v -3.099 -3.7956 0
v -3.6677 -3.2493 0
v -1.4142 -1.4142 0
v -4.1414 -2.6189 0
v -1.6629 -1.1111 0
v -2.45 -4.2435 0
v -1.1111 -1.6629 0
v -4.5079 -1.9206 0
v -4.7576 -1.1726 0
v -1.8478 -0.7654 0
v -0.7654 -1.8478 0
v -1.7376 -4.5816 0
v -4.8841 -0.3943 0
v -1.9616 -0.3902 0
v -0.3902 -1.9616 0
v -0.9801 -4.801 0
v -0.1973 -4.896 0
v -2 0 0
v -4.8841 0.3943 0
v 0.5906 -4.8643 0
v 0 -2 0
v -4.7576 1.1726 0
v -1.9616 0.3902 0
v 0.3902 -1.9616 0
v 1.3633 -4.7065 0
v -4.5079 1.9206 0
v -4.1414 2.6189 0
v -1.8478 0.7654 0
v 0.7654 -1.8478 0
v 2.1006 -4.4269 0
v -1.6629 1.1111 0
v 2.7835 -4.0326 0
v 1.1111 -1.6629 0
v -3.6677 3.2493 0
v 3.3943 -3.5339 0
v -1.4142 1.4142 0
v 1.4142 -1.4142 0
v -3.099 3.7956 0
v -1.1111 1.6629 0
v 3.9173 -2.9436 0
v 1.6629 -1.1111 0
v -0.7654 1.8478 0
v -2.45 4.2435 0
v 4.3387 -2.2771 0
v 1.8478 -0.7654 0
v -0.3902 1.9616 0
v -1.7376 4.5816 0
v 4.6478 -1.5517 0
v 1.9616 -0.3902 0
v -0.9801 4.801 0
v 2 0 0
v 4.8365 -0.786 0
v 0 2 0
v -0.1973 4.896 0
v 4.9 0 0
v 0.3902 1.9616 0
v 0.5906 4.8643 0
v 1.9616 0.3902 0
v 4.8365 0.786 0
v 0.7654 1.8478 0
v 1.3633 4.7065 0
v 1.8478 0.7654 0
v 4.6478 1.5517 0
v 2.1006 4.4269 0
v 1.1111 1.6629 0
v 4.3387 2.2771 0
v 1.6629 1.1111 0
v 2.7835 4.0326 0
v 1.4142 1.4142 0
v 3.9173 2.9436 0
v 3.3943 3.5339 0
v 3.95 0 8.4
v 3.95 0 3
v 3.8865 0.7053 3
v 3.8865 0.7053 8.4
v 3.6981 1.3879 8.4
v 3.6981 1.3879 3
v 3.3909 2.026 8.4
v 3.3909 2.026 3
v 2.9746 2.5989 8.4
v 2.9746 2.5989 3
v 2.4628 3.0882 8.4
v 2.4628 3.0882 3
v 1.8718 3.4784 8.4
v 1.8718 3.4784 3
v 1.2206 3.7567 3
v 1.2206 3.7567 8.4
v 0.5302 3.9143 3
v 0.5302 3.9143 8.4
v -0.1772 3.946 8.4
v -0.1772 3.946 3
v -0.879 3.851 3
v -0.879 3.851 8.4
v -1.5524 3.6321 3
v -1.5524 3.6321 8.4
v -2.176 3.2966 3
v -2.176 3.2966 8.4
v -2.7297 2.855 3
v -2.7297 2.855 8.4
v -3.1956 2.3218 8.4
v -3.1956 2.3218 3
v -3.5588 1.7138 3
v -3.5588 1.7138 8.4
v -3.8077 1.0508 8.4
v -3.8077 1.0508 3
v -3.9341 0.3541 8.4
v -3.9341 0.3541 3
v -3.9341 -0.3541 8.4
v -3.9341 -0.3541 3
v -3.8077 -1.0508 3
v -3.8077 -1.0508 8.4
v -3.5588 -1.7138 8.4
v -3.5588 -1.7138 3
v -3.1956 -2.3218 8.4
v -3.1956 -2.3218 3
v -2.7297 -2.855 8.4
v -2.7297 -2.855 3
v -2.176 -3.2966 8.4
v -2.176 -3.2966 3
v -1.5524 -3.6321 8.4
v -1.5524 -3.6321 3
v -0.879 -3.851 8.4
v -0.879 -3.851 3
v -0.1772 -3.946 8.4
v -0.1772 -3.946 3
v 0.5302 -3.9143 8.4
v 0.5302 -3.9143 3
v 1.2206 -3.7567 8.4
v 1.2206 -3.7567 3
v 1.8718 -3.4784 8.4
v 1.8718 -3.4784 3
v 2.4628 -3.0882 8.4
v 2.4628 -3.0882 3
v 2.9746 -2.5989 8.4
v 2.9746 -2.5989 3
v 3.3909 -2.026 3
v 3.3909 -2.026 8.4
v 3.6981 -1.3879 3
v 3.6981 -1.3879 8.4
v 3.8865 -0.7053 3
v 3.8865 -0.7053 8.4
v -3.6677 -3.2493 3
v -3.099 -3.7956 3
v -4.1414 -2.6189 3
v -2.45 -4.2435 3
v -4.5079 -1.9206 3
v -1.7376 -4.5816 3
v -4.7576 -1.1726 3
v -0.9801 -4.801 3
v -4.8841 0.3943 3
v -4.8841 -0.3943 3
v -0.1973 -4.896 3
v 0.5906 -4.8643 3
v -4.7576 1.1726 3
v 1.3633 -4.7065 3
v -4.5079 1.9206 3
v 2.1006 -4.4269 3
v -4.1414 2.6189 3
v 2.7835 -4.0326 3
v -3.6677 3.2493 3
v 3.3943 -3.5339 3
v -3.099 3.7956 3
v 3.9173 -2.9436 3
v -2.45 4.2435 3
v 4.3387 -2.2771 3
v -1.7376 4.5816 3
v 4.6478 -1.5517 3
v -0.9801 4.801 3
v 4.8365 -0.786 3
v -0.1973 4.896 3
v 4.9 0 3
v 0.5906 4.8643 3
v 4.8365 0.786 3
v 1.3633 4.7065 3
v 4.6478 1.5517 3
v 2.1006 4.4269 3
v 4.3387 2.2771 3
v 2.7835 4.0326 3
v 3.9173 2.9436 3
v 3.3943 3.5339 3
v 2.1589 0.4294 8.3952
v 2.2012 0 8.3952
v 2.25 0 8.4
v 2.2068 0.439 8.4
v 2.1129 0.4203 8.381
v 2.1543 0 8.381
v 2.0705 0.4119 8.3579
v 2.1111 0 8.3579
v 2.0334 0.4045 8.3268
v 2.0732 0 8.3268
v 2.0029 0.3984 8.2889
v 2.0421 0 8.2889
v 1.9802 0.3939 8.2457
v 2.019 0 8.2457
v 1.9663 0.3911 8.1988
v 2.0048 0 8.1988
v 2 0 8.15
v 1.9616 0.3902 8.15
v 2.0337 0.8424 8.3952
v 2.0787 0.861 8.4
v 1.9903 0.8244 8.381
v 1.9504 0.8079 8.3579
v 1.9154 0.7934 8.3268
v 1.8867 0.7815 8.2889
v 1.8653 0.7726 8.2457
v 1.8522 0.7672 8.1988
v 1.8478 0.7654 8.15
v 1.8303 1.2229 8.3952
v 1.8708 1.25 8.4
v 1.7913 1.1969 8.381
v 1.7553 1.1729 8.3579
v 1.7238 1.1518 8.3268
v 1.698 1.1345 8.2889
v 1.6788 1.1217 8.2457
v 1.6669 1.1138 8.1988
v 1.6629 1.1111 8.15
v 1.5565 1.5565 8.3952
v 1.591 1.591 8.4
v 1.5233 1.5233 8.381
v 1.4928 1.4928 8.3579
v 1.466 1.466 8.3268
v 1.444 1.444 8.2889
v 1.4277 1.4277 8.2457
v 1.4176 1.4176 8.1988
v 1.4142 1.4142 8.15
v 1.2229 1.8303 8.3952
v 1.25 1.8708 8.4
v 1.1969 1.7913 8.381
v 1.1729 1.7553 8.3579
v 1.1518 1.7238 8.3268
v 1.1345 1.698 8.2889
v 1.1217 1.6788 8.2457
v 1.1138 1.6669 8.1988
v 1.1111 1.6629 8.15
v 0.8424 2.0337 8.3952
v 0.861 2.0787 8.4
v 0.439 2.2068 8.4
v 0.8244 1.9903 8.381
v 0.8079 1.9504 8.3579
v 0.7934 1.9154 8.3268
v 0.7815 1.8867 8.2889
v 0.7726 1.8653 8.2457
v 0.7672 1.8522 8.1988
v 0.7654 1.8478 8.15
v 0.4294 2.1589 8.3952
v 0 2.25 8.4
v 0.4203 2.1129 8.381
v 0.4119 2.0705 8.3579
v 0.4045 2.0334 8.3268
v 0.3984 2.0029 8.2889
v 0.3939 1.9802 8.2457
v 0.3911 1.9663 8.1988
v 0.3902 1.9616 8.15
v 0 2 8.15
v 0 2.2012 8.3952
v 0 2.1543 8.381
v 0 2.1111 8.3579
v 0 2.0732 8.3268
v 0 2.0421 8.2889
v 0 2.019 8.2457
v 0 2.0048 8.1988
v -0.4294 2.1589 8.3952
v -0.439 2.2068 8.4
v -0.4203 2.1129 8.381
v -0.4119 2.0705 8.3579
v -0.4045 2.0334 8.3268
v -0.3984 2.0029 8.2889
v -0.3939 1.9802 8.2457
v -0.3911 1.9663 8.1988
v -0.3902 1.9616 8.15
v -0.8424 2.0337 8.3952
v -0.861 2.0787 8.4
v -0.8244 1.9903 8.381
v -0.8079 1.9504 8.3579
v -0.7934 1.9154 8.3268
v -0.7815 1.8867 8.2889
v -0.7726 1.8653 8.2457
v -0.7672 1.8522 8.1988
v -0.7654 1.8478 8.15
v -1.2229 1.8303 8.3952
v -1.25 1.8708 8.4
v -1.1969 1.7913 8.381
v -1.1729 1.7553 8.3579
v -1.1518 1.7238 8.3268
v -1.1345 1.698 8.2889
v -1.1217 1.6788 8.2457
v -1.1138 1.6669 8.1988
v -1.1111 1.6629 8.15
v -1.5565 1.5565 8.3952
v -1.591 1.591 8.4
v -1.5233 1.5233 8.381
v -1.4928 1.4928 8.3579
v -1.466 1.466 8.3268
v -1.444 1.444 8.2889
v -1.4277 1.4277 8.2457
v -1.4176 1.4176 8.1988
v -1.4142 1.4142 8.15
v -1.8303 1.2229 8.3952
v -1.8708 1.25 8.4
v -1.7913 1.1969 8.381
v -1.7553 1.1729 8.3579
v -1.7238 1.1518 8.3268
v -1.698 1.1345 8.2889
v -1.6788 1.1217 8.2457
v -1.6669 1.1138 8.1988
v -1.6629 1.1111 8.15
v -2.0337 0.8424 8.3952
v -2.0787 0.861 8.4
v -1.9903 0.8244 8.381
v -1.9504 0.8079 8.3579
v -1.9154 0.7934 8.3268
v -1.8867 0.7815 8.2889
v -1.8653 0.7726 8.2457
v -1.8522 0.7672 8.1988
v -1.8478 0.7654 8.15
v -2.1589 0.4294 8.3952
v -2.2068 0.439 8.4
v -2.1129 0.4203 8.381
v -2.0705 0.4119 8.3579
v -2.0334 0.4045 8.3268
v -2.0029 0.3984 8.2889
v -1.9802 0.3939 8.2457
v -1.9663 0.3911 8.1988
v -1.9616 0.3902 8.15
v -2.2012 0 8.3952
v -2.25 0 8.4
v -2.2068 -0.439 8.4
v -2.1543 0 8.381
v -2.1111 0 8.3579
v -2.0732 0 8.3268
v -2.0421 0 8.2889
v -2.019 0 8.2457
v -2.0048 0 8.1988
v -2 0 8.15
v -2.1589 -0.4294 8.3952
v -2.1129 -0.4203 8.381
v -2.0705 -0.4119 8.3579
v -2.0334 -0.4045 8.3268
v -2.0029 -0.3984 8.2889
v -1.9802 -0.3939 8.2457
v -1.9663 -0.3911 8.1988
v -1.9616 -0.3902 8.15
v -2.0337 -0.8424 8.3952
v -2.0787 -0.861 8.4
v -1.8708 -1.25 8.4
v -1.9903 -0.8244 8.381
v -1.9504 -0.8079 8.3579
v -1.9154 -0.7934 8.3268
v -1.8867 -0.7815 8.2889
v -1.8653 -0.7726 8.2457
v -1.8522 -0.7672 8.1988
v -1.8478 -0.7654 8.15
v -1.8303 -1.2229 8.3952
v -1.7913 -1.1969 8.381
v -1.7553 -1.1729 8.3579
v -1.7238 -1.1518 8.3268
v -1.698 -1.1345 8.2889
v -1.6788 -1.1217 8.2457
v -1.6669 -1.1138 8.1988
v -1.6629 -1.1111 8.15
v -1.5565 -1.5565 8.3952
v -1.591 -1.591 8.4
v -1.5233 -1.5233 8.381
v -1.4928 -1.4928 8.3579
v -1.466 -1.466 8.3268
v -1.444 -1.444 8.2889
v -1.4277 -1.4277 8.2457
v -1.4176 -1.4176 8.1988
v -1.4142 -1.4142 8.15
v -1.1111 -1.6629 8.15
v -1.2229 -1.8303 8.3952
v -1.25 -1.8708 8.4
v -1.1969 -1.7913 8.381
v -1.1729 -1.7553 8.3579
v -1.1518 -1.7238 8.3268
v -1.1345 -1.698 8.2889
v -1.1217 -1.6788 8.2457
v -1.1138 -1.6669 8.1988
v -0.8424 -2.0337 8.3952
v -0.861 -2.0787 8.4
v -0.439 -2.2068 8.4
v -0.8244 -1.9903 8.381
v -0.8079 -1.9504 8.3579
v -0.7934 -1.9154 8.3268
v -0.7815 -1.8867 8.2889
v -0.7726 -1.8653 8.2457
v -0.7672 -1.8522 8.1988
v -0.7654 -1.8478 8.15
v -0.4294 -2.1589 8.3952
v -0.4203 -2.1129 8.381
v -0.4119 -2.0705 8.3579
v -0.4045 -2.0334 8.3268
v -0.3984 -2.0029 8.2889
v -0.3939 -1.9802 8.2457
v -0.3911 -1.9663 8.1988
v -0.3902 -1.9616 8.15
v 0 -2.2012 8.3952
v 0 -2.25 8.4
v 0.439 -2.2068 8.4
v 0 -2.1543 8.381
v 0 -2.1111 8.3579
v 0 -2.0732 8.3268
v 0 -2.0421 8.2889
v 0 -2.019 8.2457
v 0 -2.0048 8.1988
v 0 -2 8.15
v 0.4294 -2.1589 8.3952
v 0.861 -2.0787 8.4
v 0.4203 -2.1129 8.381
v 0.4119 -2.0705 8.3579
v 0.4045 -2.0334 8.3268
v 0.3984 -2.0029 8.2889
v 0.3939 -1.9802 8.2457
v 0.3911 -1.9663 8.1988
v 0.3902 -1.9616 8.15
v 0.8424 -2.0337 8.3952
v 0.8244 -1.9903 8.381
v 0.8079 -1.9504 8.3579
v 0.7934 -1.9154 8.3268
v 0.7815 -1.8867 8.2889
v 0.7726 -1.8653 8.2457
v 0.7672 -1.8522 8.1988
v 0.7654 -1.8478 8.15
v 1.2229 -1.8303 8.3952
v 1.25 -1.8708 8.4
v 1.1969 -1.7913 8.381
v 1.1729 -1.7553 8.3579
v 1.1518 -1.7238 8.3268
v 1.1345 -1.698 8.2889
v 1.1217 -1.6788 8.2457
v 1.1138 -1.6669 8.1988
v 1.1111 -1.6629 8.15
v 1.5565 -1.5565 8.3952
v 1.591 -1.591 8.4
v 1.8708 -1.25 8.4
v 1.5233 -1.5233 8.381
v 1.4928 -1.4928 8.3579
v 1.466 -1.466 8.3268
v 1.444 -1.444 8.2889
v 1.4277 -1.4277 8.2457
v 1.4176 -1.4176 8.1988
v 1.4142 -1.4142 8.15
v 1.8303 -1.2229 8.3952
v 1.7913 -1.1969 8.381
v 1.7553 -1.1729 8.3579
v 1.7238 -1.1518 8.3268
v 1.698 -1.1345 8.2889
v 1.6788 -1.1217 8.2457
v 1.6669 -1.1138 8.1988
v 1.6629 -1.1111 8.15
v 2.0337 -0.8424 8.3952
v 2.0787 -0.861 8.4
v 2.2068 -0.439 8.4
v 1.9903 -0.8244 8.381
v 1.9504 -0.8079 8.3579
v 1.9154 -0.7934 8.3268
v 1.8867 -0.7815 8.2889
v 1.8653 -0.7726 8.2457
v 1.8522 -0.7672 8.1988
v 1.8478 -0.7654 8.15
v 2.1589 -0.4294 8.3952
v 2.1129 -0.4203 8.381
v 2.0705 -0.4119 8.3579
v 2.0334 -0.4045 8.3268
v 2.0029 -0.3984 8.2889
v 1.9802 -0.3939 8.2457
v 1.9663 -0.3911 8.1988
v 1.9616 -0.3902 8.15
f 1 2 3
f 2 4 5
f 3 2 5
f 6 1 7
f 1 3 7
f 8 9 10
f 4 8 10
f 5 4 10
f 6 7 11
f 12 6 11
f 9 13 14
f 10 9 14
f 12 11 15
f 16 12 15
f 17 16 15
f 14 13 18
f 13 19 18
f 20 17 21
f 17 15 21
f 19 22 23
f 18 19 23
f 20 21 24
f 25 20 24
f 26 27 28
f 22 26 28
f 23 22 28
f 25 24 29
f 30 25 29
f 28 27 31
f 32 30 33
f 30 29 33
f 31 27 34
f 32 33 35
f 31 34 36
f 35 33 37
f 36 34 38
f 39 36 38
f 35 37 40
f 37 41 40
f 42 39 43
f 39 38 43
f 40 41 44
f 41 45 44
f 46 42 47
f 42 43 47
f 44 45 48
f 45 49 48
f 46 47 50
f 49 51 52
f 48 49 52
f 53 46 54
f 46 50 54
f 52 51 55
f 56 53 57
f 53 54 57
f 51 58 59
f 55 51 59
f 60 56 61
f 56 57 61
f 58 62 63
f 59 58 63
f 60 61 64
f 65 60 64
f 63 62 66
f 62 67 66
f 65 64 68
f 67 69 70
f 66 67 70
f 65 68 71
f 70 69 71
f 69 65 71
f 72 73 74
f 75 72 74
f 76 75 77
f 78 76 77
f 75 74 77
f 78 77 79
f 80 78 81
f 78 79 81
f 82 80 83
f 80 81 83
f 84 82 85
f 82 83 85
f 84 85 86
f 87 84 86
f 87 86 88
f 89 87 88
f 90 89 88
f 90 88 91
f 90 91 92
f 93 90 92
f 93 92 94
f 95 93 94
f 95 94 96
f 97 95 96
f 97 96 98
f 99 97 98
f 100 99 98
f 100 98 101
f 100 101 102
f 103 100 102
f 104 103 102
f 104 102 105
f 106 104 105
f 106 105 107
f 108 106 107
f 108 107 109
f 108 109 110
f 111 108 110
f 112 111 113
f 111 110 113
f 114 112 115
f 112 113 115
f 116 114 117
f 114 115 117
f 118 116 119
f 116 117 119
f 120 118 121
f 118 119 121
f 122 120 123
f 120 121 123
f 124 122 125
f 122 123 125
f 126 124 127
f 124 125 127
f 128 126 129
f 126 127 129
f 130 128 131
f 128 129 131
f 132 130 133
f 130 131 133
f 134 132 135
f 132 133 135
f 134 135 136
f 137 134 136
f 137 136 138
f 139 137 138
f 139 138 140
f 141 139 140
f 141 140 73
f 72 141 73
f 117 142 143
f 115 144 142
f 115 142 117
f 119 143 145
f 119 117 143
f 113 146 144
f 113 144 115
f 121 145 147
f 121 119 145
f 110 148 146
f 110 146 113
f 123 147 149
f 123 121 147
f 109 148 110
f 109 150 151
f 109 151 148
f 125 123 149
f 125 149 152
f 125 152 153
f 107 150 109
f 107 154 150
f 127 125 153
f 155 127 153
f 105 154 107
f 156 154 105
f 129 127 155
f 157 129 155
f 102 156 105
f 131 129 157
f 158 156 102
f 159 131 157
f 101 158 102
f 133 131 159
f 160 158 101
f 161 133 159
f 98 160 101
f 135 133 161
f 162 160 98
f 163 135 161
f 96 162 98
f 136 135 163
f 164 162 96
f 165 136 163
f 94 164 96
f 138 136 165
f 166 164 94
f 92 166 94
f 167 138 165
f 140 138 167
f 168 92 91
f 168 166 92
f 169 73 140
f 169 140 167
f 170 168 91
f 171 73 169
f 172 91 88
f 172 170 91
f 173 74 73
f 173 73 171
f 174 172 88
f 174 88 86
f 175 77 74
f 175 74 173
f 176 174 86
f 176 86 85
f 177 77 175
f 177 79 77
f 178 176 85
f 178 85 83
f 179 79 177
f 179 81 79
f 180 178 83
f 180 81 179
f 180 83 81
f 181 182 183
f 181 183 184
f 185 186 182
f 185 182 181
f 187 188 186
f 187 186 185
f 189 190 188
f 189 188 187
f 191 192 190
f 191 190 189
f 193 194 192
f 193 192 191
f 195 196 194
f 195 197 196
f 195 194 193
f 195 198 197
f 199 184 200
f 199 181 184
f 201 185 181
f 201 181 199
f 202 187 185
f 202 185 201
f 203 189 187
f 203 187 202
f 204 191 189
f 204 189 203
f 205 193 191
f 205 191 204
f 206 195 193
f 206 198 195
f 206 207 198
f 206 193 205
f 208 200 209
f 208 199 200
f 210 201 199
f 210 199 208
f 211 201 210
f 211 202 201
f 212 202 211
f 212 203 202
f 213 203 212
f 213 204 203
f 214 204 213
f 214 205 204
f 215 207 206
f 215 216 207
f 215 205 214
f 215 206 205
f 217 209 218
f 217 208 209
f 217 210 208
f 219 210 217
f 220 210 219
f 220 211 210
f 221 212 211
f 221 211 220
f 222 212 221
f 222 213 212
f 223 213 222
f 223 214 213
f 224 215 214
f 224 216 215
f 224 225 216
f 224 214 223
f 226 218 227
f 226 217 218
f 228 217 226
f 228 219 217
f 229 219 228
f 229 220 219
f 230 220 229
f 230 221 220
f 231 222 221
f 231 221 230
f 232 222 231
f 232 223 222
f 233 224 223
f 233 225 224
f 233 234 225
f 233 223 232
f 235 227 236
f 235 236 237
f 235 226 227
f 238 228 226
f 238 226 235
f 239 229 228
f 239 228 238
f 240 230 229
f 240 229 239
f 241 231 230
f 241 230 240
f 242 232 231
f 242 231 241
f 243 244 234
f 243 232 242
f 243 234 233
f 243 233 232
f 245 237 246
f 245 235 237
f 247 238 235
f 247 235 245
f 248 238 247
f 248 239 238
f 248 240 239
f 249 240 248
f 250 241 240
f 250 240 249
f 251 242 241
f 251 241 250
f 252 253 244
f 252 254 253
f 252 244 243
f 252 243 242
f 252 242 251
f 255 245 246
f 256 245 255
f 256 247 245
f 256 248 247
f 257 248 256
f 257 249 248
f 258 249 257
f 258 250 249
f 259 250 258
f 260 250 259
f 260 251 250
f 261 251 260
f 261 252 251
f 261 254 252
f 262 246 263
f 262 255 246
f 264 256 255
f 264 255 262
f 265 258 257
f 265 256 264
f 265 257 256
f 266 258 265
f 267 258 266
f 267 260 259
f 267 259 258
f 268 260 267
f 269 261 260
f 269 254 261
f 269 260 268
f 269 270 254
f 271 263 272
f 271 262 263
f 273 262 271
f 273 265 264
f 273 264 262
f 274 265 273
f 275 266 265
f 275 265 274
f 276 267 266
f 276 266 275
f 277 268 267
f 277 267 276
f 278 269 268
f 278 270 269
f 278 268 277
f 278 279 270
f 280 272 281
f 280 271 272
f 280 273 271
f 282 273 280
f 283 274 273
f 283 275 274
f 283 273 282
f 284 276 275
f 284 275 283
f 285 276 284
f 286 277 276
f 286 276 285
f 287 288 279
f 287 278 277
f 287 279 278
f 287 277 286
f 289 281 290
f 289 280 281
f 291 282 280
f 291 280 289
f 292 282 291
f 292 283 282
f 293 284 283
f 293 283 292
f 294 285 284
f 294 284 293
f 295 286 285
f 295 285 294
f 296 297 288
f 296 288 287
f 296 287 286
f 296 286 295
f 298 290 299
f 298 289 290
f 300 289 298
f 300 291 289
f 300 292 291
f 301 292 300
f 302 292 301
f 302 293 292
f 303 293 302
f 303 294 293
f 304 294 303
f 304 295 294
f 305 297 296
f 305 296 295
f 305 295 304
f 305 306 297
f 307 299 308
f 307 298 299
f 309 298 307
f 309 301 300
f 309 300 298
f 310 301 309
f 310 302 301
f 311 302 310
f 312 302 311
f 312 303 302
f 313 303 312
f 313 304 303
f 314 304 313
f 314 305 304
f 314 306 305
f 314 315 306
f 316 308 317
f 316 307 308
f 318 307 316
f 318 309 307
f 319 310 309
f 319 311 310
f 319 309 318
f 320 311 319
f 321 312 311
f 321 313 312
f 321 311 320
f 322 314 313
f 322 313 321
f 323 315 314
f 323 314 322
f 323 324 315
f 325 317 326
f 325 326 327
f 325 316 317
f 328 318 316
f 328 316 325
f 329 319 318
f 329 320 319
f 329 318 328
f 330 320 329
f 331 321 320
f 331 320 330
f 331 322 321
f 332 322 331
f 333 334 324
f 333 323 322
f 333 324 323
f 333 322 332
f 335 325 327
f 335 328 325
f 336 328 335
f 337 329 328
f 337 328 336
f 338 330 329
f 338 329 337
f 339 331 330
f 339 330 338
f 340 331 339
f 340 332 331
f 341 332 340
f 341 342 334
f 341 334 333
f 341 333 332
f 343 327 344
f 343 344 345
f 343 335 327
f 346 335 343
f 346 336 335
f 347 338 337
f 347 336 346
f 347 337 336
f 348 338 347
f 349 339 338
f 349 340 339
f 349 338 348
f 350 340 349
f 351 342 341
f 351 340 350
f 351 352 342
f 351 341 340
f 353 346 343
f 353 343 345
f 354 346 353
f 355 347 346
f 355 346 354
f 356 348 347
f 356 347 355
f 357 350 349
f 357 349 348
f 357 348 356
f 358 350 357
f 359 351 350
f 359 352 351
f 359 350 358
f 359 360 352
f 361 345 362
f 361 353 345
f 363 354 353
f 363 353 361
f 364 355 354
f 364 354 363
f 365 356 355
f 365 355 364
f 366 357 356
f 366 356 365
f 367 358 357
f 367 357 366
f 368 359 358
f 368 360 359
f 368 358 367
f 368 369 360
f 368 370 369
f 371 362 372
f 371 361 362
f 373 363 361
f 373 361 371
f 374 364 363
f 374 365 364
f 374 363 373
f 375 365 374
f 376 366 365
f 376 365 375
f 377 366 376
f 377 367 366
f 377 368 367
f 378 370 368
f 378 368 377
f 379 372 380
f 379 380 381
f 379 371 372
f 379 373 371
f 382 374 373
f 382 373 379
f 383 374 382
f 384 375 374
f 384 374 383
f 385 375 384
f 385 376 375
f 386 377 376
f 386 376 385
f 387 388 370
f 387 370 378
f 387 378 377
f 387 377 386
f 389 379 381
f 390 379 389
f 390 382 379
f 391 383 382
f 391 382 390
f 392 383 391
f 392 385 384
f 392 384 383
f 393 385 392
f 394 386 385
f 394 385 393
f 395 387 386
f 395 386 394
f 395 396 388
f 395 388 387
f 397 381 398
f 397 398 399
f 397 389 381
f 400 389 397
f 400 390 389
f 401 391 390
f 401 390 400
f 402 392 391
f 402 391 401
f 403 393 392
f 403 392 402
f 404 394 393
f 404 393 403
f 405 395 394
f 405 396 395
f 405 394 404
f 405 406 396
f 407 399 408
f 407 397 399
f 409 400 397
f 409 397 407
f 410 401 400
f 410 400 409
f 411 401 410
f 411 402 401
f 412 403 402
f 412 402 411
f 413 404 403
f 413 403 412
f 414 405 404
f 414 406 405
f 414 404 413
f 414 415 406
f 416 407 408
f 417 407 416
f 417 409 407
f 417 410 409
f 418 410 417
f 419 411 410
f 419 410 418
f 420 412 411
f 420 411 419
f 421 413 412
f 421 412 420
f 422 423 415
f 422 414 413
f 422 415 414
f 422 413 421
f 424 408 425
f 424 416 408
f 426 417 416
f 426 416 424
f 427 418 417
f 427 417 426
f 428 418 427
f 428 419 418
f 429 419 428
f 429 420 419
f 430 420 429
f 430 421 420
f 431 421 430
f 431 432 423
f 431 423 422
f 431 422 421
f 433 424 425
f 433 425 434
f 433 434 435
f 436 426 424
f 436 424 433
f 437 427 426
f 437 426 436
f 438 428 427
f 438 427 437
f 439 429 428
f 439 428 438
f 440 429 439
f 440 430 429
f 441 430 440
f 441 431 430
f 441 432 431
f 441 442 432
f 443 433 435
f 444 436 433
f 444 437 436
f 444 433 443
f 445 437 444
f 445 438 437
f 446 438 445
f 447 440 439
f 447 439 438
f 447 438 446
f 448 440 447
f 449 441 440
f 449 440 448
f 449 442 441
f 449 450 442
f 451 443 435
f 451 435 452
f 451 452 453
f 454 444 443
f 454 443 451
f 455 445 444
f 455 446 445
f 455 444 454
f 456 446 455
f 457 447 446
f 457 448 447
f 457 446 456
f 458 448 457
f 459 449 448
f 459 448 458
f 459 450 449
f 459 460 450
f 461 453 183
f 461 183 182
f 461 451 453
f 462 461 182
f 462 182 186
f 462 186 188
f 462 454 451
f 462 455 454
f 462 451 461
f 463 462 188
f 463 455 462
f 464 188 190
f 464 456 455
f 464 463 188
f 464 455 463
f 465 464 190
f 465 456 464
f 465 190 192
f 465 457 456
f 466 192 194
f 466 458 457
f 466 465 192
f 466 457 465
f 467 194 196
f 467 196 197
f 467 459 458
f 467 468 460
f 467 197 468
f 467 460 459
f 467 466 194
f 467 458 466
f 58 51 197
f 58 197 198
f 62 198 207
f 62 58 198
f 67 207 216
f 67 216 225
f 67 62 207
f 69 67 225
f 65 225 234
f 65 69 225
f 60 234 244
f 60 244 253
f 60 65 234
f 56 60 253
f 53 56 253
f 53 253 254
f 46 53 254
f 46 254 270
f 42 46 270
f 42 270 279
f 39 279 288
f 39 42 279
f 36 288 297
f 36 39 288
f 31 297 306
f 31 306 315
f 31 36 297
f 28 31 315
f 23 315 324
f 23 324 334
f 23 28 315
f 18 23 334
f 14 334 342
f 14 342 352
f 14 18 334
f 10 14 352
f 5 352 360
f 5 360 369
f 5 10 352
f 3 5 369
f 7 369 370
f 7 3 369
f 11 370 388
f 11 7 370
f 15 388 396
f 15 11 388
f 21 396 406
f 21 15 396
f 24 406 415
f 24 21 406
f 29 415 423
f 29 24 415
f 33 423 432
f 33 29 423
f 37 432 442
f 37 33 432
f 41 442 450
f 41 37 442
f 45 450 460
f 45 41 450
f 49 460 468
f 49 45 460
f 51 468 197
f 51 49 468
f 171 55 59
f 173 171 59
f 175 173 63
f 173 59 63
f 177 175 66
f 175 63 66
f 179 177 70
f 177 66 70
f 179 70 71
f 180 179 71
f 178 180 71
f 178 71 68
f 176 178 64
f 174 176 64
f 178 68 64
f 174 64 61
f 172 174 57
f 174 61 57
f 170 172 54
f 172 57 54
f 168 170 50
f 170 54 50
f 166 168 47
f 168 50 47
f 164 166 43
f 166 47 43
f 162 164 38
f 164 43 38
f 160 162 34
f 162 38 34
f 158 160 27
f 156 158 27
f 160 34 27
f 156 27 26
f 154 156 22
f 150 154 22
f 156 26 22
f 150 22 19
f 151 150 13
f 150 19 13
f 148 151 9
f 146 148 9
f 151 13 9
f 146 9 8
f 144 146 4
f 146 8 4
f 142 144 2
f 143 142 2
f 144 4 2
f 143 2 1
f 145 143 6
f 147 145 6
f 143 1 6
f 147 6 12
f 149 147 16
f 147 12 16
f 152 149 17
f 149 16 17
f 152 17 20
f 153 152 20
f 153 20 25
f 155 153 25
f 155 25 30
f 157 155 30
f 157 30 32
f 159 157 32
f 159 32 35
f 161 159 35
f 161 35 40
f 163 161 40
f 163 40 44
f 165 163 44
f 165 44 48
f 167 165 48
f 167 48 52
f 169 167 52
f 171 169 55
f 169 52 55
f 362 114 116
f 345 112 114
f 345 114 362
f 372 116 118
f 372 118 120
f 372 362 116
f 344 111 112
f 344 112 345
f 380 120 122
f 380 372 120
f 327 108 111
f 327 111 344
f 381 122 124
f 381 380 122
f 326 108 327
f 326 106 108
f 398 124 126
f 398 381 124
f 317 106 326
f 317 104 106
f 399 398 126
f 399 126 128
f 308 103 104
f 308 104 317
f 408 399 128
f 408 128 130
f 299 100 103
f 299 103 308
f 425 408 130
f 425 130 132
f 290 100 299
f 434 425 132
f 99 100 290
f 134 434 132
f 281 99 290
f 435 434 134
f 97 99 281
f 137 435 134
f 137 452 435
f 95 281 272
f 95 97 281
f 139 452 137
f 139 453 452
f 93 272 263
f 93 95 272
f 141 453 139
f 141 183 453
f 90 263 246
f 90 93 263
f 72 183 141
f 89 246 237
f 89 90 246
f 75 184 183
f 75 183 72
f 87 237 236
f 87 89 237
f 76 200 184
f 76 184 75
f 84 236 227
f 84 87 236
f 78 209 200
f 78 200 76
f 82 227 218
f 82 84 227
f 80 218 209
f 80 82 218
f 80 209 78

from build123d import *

# Parameters (mm, degrees)
F0_R     = 4.9
F0_R_2   = 3.95
F1_DEPTH = 3
F0_R_3   = 2
F2_DEPTH = 8.4
F3_R     = 0.25


with BuildPart() as f1:
    # F0 (on Top) → F1 (new body)
    with BuildSketch(Plane.XY):
        Circle(F0_R)
        Circle(F0_R_2, mode=Mode.SUBTRACT)
    extrude(amount=F1_DEPTH)

    # F0 (on Top) → F2 (join)
    with BuildSketch(Plane.XY):
        Circle(F0_R_2)
        Circle(F0_R_3, mode=Mode.SUBTRACT)
    extrude(amount=F2_DEPTH)

    # F3
    f3_edges = [f1.edges().sort_by_distance(p)[0] for p in [
        (-2, 0, 8.4),
    ]]
    fillet(f3_edges, radius=F3_R)


solid = f1.part
